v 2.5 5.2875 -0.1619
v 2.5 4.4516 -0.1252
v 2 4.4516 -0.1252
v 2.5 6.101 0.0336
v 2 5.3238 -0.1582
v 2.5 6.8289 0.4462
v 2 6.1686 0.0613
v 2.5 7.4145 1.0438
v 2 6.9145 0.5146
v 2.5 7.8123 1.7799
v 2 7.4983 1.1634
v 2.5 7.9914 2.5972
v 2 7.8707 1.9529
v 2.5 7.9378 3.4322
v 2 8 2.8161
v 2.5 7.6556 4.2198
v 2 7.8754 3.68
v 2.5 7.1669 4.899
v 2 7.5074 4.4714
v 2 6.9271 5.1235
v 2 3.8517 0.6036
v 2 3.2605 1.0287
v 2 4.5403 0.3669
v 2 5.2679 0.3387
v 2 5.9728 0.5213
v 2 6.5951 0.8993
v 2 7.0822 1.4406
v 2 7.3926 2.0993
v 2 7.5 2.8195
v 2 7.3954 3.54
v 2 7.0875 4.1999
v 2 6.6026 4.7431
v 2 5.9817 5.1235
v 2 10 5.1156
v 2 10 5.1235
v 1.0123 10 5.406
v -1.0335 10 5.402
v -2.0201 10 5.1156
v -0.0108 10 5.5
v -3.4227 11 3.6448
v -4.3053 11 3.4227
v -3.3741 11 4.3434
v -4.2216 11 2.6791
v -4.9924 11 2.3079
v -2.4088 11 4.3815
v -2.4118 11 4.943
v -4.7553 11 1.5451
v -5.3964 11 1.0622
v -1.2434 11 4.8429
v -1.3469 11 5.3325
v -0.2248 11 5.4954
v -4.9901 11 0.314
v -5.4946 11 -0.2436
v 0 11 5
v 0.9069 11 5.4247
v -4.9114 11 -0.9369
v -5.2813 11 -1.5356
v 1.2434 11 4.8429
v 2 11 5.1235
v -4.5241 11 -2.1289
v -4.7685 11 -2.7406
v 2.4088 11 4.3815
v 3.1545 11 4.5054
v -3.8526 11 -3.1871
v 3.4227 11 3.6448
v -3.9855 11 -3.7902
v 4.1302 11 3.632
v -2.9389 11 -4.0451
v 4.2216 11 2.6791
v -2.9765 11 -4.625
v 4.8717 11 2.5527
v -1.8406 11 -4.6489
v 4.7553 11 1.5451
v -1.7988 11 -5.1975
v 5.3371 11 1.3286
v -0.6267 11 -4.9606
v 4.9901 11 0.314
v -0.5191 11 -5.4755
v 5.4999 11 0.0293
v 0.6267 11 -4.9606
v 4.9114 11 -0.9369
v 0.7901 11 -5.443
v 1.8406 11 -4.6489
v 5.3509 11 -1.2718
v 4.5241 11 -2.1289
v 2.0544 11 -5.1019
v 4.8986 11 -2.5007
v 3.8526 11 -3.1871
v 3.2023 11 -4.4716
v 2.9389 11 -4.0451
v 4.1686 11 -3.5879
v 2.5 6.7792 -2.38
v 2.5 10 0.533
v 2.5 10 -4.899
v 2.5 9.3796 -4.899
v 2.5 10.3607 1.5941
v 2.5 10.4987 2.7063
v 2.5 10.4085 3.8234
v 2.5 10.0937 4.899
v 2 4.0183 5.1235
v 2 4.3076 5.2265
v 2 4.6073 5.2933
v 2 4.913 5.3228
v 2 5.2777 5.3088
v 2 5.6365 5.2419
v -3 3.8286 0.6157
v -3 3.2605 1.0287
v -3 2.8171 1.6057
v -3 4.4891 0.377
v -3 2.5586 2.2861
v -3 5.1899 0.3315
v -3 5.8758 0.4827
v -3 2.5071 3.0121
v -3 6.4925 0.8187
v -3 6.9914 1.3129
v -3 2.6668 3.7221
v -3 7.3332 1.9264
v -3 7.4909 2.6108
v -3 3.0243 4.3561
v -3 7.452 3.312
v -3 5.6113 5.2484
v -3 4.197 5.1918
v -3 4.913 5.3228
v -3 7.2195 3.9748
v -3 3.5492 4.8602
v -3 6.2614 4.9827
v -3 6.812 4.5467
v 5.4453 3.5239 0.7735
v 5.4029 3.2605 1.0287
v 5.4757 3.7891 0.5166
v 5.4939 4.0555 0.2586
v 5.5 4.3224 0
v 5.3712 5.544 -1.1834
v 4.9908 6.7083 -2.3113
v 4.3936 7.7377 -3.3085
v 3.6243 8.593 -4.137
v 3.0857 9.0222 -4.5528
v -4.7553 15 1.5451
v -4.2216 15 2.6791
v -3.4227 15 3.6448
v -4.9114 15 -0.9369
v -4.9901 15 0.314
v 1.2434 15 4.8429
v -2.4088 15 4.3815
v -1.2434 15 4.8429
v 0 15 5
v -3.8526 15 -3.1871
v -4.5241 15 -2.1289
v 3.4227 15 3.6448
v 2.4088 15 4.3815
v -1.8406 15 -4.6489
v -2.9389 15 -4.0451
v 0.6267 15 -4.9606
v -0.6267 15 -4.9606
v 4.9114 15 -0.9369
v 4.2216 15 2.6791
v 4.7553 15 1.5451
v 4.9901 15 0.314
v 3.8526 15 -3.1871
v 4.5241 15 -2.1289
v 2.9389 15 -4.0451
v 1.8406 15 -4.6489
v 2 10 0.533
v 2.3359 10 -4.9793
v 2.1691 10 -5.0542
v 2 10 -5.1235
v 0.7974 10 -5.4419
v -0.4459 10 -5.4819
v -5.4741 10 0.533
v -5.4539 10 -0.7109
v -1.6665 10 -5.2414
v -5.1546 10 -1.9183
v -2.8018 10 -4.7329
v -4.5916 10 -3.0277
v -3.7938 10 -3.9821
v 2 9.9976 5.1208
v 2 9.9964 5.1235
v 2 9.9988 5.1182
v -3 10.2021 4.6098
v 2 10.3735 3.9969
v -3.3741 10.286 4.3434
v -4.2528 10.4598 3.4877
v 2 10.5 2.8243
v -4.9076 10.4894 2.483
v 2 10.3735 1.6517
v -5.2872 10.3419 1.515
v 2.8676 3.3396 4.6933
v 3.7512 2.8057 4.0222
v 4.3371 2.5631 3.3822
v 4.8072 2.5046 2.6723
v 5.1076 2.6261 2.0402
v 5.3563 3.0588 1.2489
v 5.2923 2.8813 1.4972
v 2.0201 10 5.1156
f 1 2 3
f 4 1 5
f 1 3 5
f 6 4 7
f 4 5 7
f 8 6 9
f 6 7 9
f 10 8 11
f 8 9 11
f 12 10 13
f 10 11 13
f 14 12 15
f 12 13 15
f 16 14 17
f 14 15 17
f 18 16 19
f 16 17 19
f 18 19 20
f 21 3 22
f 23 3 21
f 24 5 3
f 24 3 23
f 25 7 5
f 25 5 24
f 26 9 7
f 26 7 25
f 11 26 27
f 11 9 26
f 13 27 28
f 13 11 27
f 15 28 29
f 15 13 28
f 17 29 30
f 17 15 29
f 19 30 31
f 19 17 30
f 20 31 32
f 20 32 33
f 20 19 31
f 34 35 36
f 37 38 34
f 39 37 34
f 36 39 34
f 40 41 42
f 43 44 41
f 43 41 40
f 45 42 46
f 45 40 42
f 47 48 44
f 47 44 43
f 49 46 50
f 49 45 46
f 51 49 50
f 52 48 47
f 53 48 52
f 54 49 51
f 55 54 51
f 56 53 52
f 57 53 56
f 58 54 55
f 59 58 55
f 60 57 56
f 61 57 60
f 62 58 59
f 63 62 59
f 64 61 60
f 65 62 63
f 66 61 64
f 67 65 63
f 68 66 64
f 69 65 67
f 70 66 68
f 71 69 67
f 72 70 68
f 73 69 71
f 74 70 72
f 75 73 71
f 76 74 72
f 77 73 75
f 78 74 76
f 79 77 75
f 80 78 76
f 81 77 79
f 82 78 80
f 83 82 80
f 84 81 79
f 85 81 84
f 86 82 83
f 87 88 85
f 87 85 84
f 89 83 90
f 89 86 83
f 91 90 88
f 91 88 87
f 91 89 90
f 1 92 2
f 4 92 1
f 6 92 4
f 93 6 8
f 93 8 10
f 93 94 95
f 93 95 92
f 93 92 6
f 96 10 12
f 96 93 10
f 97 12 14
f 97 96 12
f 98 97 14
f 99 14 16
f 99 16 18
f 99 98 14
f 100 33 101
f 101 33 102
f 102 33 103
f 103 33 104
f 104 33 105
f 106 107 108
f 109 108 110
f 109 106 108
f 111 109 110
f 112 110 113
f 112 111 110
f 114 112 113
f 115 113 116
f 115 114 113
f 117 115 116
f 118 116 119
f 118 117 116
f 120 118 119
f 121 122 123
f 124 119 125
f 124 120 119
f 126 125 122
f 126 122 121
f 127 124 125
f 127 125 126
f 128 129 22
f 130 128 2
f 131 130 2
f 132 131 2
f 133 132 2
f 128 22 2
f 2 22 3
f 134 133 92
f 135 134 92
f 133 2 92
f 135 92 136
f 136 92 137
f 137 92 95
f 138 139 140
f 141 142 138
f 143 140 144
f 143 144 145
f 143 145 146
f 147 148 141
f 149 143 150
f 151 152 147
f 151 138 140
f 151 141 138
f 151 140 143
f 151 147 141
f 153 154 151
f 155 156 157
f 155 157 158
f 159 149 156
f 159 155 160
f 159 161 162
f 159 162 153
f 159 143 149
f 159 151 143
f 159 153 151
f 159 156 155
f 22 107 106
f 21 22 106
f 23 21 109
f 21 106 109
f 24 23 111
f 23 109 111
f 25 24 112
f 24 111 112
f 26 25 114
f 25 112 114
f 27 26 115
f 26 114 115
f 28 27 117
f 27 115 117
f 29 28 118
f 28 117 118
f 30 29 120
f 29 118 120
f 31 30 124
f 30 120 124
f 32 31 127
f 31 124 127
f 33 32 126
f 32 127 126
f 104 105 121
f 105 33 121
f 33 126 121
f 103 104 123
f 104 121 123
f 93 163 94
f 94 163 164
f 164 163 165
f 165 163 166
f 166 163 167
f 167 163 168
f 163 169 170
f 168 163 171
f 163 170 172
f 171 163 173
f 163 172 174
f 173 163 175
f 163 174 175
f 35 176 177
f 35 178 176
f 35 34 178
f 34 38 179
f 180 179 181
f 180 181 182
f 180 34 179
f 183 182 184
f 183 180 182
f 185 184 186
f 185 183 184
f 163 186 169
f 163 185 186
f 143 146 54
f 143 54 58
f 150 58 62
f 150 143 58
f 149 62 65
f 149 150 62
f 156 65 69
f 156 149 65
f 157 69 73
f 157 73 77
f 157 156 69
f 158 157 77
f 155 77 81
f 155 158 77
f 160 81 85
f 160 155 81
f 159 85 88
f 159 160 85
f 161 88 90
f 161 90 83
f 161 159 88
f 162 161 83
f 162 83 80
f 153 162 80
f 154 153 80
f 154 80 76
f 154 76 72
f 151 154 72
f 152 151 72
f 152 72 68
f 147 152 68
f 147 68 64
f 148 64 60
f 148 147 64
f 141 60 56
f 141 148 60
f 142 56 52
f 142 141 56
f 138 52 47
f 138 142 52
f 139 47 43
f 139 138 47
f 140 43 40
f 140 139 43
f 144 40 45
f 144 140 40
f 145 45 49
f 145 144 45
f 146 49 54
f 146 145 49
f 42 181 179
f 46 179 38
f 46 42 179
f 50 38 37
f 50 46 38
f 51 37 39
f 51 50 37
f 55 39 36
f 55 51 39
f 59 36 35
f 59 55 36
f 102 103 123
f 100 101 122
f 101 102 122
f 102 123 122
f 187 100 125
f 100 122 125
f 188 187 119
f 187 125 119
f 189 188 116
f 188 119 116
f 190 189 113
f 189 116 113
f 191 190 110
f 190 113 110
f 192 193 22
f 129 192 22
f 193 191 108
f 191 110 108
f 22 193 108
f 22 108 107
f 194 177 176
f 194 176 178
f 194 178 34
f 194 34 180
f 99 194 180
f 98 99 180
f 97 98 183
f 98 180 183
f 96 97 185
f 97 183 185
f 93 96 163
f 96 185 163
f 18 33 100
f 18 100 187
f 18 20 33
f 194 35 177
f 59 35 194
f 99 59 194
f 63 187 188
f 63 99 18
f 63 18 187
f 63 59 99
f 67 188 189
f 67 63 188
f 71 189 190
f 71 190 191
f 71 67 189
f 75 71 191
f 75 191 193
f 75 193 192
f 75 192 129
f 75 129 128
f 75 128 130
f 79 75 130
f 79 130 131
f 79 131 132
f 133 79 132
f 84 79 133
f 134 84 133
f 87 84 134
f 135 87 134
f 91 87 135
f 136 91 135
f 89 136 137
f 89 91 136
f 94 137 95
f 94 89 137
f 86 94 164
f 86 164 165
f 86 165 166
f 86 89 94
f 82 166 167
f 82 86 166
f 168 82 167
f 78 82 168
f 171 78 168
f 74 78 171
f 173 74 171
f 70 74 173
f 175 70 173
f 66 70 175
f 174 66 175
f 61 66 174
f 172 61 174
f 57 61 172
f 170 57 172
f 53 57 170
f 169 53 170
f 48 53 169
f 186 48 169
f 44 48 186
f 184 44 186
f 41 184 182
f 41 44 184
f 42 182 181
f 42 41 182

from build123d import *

# Parameters (mm, degrees)
SKETCH1_W               = 11
SKETCH1_H               = 11
BOSS_EXTRUDE1_DEPTH     = 15
SKETCH2_R               = 11.526525906
SKETCH2_R_2             = 5
CUT_EXTRUDE1_DEPTH      = 4
SKETCH3_R               = 9.335544837
SKETCH3_R_2             = 5.5
CUT_EXTRUDE2_DEPTH      = 1
CUT_EXTRUDE4_DEPTH      = 20.397164741
CUT_EXTRUDE5_DEPTH      = 7.5
SKETCH7_R               = 4.206819523
CUT_EXTRUDE6_DEPTH      = 2.5
SKETCH8_R               = 8.743774997
CUT_EXTRUDE7_DEPTH      = 12.521718622
SKETCH9_R               = 5.5
SKETCH9_R_2             = 2.5
CUT_EXTRUDE8_DEPTH      = 5
CUT_EXTRUDE8_DEPTH_BACK = 5
CUT_EXTRUDE9_DEPTH      = 0.5


with BuildPart() as part:
    # Sketch1 → Boss-Extrude1 (new body)
    with BuildSketch(Plane(origin=(0, 0, 0), x_dir=(1, 0, 0), z_dir=(0, 1, 0))):
        Rectangle(SKETCH1_W, SKETCH1_H)
    extrude(amount=BOSS_EXTRUDE1_DEPTH)

    # Sketch2 → Cut-Extrude1 (cut)
    with BuildSketch(Plane(origin=(0, 15, 0), x_dir=(1, 0, 0), z_dir=(0, 1, 0))):
        Circle(SKETCH2_R)
        with Locations(Location((0, 0, 0), (0, 0, 270))):
            Circle(SKETCH2_R_2, mode=Mode.SUBTRACT)
    extrude(amount=-CUT_EXTRUDE1_DEPTH, mode=Mode.SUBTRACT)

    # Sketch3 → Cut-Extrude2 (cut)
    with BuildSketch(Plane(origin=(0, 11, 0), x_dir=(1, 0, 0), z_dir=(0, 1, 0))):
        Circle(SKETCH3_R)
        with Locations(Location((0, 0, 0), (0, 0, 270))):
            Circle(SKETCH3_R_2, mode=Mode.SUBTRACT)
    extrude(amount=-CUT_EXTRUDE2_DEPTH, mode=Mode.SUBTRACT)

    # Sketch4 → Cut-Extrude4 (cut, through all)
    with BuildSketch(Plane.ZY.offset(5.5)):
        with BuildLine():
            Line((1.028660662, 3.260538449), (-5.5, 10))
            Line((-5.5, 10), (-9.452355575, 12.560239237))
            Line((-9.452355575, 12.560239237), (-9.996263861, -3.051690792))
            Line((-9.996263861, -3.051690792), (13.077304092, -2.572417867))
            Line((13.077304092, -2.572417867), (11.793537329, 10))
            Line((11.793537329, 10), (5.5, 10))
            Line((5.5, 10), (5.32277104, 4.912954629))
            ThreePointArc((5.32277104, 4.912954629), (3.722129922, 2.666788079), (1.028660662, 3.260538449))
        make_face()
    extrude(amount=-CUT_EXTRUDE4_DEPTH, mode=Mode.SUBTRACT)

    # Sketch6 → Cut-Extrude5 (cut)
    with BuildSketch(Plane.ZY.offset(5.5)):
        with BuildLine():
            Line((5.32277104, 4.912954629), (5.5, 10))
            Line((5.5, 10), (-5.5, 10))
            Line((-5.5, 10), (1.028660662, 3.260538449))
            ThreePointArc((1.028660662, 3.260538449), (1.926443835, 7.333211921), (5.32277104, 4.912954629))
        make_face()
    extrude(amount=-CUT_EXTRUDE5_DEPTH, mode=Mode.SUBTRACT)

    # Sketch7 → Cut-Extrude6 (cut)
    with BuildSketch(Plane.ZY.offset(5.5)):
        with Locations((2.824286879, 5)):
            Circle(SKETCH7_R)
    extrude(amount=-CUT_EXTRUDE6_DEPTH, mode=Mode.SUBTRACT)

    # Sketch8 → Cut-Extrude7 (cut, through all)
    with BuildSketch(Plane(origin=(0, 11, 0), x_dir=(1, 0, 0), z_dir=(0, 1, 0))):
        Circle(SKETCH8_R)
        with BuildLine():
            Line((0, -5.5), (2, -5.5))
            Line((2, -5.5), (2, -5.123475383))
            ThreePointArc((2, -5.123475383), (0.790050421, 5.442960622), (-3.374127459, -4.343416154))
            Line((-3.374127459, -4.343416154), (-3.374127459, -5.5))
            Line((-3.374127459, -5.5), (0, -5.5))
        make_face(mode=Mode.SUBTRACT)
    extrude(amount=-CUT_EXTRUDE7_DEPTH, mode=Mode.SUBTRACT)

    # Sketch9 → Cut-Extrude8 (cut, two sides)
    with BuildSketch(Plane.ZY.offset(3)) as cut_extrude8_sk:
        with Locations((2.824286879, 5)):
            Circle(SKETCH9_R)
        with Locations((2.824286879, 5)):
            Circle(SKETCH9_R_2, mode=Mode.SUBTRACT)
    extrude(amount=CUT_EXTRUDE8_DEPTH, mode=Mode.SUBTRACT)
    extrude(cut_extrude8_sk.sketch, amount=-CUT_EXTRUDE8_DEPTH_BACK, mode=Mode.SUBTRACT)

    # Sketch10 → Cut-Extrude9 (cut)
    with BuildSketch(Plane.ZY.offset(-2)):
        with BuildLine():
            ThreePointArc((-0.125167599, 4.451622134), (1.544554545, 7.71335312), (5.123475383, 6.927104621))
            Line((5.123475383, 6.927104621), (5.123475383, 9.996371906))
            ThreePointArc((5.123475383, 9.996371906), (5.119525771, 9.998187514), (5.115574726, 10))
            ThreePointArc((5.115574726, 10), (2.824286879, 10.5), (0.532999031, 10))
            Line((0.532999031, 10), (-5.123475383, 10))
            Line((-5.123475383, 10), (-5.123475383, 9.611317955))
            Line((-5.123475383, 9.611317955), (-2.379973921, 6.779232849))
            Line((-2.379973921, 6.779232849), (-0.125167599, 4.451622134))
        make_face()
    extrude(amount=-CUT_EXTRUDE9_DEPTH, mode=Mode.SUBTRACT)


solid = part.part
